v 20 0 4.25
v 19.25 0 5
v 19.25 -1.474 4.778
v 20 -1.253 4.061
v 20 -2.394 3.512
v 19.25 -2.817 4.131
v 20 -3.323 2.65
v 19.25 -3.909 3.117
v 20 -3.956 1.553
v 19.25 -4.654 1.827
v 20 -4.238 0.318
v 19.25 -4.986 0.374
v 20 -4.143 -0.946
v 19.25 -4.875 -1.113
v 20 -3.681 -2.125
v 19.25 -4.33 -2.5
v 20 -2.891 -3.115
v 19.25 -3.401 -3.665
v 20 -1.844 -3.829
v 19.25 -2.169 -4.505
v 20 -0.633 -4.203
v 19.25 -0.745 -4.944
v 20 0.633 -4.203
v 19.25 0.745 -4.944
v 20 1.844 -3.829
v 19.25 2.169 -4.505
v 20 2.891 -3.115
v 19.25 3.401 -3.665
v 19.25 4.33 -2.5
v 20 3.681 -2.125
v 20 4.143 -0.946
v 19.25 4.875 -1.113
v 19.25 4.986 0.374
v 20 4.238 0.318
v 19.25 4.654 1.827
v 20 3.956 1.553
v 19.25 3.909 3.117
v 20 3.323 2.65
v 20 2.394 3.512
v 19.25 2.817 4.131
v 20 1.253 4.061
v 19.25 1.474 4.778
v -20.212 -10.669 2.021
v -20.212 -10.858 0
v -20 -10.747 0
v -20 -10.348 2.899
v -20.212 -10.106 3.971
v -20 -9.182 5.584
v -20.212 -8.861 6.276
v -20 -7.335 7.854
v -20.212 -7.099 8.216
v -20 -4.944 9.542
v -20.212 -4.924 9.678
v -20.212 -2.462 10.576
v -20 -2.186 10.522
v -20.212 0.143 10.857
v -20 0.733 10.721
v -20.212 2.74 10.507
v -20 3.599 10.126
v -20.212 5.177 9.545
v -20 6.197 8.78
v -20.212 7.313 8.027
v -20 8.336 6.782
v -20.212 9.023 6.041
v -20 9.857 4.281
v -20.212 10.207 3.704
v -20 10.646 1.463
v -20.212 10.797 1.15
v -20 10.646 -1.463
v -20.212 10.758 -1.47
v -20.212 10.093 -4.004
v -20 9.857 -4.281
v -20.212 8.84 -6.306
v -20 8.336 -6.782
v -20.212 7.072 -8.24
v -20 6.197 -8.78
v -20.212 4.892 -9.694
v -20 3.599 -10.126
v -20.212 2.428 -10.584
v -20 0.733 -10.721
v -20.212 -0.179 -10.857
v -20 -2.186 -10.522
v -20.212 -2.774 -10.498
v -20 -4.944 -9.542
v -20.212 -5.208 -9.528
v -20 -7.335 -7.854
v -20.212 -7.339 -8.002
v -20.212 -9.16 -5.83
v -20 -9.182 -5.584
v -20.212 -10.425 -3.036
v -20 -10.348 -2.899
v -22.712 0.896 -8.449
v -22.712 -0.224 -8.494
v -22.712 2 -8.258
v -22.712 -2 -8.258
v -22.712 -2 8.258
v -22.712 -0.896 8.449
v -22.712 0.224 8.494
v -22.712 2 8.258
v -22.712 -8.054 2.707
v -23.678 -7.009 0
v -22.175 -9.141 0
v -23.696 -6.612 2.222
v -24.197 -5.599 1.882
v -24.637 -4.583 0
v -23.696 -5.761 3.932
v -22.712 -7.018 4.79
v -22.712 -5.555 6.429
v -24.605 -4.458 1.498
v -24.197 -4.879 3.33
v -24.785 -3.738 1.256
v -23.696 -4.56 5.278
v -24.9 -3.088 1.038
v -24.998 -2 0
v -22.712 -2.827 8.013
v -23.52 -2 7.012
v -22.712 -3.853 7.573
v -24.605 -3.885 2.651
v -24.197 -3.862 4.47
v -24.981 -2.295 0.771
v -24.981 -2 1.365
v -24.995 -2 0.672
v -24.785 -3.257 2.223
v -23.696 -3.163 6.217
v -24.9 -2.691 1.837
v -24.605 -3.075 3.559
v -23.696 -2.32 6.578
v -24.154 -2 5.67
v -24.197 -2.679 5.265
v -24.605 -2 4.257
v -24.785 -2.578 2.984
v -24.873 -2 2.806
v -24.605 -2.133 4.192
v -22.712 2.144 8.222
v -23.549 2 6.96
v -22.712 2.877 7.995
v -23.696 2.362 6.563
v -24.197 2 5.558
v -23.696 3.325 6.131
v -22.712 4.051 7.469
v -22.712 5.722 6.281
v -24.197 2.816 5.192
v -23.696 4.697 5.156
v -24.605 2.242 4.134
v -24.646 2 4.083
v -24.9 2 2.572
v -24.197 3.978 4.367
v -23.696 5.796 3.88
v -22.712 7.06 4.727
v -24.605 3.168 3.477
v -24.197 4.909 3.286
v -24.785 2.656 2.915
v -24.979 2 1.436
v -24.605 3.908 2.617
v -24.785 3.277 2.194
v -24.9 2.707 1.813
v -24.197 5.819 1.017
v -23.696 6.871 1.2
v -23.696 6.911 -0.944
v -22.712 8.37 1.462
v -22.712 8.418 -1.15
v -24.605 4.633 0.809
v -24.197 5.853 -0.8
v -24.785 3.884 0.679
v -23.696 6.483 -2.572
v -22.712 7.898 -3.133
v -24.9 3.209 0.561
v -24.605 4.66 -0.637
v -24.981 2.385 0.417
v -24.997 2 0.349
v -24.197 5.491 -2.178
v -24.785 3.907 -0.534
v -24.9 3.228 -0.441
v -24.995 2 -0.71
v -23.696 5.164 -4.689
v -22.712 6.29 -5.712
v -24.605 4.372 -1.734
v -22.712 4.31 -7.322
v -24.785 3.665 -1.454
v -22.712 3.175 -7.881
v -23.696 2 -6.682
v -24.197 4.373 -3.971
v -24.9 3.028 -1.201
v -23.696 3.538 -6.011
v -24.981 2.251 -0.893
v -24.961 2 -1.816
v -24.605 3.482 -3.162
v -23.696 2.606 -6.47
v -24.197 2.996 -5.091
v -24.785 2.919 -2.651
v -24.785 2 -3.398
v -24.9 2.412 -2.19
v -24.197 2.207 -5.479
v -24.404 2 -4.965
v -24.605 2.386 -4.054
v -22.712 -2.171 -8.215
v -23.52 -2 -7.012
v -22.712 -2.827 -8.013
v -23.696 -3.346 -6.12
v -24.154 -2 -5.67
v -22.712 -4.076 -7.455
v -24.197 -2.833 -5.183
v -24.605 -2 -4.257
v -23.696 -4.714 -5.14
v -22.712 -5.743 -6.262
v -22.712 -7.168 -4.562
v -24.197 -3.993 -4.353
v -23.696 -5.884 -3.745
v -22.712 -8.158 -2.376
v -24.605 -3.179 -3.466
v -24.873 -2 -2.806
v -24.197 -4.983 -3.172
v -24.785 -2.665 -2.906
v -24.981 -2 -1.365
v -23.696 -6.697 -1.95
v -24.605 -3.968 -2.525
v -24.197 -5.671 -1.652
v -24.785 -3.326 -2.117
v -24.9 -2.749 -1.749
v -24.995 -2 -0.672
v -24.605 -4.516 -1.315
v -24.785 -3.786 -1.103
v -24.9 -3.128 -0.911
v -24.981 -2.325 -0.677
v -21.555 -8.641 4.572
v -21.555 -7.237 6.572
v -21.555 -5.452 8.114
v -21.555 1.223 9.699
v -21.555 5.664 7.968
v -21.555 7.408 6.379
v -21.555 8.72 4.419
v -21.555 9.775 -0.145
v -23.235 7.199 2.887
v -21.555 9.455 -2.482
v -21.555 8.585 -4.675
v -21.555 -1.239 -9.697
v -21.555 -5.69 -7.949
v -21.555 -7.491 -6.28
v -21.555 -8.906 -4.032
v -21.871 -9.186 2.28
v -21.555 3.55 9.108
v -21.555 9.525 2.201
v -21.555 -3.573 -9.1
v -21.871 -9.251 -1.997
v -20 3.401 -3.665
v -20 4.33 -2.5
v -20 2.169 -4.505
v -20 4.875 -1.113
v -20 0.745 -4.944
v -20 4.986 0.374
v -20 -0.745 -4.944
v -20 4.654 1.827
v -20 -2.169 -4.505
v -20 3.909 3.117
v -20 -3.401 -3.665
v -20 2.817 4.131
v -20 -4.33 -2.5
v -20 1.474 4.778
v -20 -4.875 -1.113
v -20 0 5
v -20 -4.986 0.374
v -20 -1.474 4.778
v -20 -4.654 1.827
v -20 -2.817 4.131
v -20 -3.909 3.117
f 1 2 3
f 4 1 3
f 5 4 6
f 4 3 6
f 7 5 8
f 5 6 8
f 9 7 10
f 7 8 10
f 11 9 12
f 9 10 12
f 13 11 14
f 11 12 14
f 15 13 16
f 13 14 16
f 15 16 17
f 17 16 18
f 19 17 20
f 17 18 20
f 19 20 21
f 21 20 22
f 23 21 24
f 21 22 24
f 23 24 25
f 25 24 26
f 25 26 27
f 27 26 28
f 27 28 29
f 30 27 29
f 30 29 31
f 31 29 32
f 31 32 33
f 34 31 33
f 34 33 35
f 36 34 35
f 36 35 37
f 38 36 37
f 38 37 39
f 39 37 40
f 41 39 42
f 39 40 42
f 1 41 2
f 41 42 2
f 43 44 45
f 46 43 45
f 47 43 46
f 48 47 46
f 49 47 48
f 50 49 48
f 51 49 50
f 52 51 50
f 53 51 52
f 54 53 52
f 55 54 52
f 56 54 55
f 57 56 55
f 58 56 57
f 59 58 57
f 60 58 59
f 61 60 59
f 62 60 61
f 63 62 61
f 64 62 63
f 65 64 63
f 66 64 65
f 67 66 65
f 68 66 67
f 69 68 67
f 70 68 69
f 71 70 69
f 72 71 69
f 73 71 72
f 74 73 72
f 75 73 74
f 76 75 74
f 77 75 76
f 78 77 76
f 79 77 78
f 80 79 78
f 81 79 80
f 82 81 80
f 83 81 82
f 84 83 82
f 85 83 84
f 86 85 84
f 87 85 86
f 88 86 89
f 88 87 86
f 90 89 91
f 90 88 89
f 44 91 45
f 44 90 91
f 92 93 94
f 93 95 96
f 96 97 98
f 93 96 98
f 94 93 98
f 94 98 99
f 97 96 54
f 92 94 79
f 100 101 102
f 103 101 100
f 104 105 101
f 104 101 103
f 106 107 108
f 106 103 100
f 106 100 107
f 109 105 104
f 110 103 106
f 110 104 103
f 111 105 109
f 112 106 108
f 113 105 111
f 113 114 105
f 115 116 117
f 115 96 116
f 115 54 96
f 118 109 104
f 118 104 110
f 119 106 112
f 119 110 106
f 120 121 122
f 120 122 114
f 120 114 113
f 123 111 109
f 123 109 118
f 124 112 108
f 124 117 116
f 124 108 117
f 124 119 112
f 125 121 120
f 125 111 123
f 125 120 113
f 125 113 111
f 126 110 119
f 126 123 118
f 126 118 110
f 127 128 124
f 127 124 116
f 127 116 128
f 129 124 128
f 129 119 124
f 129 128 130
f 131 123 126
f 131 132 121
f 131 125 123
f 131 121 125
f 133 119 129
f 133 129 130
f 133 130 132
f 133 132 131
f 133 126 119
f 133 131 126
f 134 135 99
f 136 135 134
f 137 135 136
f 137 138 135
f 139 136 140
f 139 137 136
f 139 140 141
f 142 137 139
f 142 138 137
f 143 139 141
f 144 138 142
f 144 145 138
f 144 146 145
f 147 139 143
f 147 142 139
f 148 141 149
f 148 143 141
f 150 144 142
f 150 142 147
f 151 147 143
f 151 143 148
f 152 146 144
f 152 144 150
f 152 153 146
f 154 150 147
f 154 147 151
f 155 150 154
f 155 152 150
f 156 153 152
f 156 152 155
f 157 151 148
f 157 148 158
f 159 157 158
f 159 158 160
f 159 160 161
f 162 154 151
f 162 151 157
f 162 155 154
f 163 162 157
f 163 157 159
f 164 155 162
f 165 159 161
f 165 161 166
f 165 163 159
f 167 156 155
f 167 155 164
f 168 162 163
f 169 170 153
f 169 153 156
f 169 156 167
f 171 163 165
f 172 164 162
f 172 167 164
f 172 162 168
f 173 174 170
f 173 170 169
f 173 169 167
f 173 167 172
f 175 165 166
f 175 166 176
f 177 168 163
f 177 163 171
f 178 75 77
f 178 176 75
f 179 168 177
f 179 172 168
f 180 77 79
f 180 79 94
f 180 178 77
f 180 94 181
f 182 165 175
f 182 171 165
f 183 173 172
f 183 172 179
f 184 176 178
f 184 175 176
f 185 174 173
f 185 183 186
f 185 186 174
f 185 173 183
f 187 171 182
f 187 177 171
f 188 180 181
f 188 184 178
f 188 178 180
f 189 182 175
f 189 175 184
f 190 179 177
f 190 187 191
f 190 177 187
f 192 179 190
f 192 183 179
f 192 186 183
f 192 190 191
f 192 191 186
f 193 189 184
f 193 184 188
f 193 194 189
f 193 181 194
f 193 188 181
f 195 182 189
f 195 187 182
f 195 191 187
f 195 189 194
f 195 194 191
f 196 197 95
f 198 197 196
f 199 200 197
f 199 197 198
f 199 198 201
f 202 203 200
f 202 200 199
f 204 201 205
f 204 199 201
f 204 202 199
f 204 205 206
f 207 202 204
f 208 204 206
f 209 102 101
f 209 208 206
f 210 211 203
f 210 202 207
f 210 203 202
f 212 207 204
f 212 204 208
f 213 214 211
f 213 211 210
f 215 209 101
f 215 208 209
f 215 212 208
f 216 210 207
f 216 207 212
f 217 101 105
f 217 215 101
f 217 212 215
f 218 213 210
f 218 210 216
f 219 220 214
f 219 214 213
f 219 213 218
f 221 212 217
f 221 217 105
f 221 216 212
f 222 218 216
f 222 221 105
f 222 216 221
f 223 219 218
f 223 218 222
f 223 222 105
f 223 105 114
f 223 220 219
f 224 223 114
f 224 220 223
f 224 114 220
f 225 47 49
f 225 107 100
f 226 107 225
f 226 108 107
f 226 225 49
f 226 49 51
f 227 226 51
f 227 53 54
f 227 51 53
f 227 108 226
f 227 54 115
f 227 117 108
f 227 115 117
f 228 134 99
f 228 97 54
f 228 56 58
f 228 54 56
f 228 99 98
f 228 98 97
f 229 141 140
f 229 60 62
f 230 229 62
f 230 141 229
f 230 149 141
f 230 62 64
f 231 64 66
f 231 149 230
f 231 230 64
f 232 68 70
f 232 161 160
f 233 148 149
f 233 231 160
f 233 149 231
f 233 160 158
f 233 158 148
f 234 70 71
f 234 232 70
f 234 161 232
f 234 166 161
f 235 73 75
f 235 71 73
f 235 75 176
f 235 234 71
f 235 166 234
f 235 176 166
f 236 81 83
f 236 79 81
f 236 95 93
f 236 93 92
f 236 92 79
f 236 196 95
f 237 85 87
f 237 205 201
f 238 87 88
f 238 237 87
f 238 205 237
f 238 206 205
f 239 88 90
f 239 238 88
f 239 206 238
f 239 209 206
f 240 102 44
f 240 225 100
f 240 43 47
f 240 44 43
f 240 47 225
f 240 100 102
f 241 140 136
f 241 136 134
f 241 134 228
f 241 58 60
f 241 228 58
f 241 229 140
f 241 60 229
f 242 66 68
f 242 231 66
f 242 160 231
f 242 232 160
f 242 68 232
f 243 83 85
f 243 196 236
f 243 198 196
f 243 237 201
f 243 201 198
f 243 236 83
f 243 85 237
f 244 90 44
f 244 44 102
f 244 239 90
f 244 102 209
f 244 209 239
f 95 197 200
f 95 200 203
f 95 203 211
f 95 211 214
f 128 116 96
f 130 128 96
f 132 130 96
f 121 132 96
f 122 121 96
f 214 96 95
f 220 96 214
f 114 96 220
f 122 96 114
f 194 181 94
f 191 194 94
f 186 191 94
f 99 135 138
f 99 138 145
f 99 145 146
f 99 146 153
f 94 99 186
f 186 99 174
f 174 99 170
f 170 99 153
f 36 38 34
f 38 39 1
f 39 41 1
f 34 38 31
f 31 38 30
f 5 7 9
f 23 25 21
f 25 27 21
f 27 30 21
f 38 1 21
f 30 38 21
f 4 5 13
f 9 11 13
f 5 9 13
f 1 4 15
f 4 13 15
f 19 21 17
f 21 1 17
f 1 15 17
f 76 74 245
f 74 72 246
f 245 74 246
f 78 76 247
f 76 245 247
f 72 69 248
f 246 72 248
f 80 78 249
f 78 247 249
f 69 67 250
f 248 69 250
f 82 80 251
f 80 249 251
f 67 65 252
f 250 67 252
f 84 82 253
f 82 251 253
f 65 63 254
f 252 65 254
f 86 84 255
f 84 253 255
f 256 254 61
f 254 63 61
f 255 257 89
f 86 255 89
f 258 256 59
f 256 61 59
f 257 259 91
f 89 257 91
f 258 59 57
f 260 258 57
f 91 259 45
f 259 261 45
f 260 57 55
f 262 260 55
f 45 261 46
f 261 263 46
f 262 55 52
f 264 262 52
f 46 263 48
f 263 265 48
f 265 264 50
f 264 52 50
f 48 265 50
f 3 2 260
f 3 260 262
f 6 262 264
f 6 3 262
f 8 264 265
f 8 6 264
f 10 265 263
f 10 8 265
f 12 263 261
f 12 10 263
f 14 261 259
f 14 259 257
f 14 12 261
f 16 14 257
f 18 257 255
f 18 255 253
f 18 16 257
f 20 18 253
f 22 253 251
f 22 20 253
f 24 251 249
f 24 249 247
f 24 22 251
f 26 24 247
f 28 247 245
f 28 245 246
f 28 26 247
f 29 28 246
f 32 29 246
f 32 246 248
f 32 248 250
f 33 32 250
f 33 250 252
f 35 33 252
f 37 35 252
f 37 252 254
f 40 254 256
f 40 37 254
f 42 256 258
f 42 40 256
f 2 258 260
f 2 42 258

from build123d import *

# Parameters (mm, degrees)
F0_W     = 40
F0_H     = 5
F2_SIZE  = 0.75
F3_R     = 11
F3_R_2   = 5
F4_DEPTH = 5
F7_W     = 5
F7_H     = 4
F8_DEPTH = 12.5


# Not quite as in the source:
# - a fillet or chamfer that OpenCascade refuses, or shapes differently, is made with other operations: its cross-section is extruded or revolved along the edge and cut away or added


with BuildPart() as f1:
    # F0 (on Front) → F1 (revolve)
    with BuildSketch(Plane.XZ):
        with Locations((0, 2.5)):
            Rectangle(F0_W, F0_H)
    revolve(axis=Axis((0, 0, 0), (1, 0, 0)))

    # F2
    f2_edges = [f1.edges().sort_by_distance(p)[0] for p in [
        (20, 0, -5),
    ]]
    chamfer(f2_edges, length=F2_SIZE)

    # F3 (on face) → F4 (join)
    with BuildSketch(Plane(origin=(-20, 0, 0), x_dir=(0, -1, 0), z_dir=(-1, 0, 0))):
        Circle(F3_R)
        Circle(F3_R_2, mode=Mode.SUBTRACT)
        Circle(F3_R_2)
    extrude(amount=F4_DEPTH)

    # F5: fillet of radius 11 on 1 edges, made by hand

    # F5_s1 → F5_t2 (revolve, cut)
    with BuildSketch(Plane.XY):
        with BuildLine():
            ThreePointArc((-20, -11), (-23.6695398029, -7.0244997836), (-25, -1.7804555427))
            Line((-25, -1.7804555427), (-25, -11))
            Line((-25, -11), (-20, -11))
        make_face()
    revolve(axis=Axis((-25, 0, 0), (-1, 0, 0)), mode=Mode.SUBTRACT)

    # F6: chamfer of 0.25 on 1 edges, made by hand

    # F6_s1 → F6_t2 (revolve, cut)
    with BuildSketch(Plane.XY):
        with BuildLine():
            Line((-19.9911548293, -10.7418502329), (-20.2209951465, -10.8630715284))
            Line((-20.2209951465, -10.8630715284), (-20.2238188511, -10.8671978697))
            ThreePointArc((-20.2238188511, -10.8671978697), (-20.1112438047, -10.9326533203), (-20.0027272727, -11.004190702))
            Line((-20.0027272727, -11.004190702), (-19.995, -11))
            ThreePointArc((-19.995, -11), (-19.995, -10.8709251165), (-19.9861548293, -10.7418502329))
            Line((-19.9861548293, -10.7418502329), (-19.9911548293, -10.7418502329))
        make_face()
    revolve(axis=Axis((-20, 0, 0), (-1, 0, 0)), mode=Mode.SUBTRACT)

    # F7 (on Top) → F8 (cut, symmetric)
    with BuildSketch(Plane.XY):
        with Locations((-25.2117160708, 0)):
            Rectangle(F7_W, F7_H)
    extrude(amount=F8_DEPTH, both=True, mode=Mode.SUBTRACT)


solid = f1.part
